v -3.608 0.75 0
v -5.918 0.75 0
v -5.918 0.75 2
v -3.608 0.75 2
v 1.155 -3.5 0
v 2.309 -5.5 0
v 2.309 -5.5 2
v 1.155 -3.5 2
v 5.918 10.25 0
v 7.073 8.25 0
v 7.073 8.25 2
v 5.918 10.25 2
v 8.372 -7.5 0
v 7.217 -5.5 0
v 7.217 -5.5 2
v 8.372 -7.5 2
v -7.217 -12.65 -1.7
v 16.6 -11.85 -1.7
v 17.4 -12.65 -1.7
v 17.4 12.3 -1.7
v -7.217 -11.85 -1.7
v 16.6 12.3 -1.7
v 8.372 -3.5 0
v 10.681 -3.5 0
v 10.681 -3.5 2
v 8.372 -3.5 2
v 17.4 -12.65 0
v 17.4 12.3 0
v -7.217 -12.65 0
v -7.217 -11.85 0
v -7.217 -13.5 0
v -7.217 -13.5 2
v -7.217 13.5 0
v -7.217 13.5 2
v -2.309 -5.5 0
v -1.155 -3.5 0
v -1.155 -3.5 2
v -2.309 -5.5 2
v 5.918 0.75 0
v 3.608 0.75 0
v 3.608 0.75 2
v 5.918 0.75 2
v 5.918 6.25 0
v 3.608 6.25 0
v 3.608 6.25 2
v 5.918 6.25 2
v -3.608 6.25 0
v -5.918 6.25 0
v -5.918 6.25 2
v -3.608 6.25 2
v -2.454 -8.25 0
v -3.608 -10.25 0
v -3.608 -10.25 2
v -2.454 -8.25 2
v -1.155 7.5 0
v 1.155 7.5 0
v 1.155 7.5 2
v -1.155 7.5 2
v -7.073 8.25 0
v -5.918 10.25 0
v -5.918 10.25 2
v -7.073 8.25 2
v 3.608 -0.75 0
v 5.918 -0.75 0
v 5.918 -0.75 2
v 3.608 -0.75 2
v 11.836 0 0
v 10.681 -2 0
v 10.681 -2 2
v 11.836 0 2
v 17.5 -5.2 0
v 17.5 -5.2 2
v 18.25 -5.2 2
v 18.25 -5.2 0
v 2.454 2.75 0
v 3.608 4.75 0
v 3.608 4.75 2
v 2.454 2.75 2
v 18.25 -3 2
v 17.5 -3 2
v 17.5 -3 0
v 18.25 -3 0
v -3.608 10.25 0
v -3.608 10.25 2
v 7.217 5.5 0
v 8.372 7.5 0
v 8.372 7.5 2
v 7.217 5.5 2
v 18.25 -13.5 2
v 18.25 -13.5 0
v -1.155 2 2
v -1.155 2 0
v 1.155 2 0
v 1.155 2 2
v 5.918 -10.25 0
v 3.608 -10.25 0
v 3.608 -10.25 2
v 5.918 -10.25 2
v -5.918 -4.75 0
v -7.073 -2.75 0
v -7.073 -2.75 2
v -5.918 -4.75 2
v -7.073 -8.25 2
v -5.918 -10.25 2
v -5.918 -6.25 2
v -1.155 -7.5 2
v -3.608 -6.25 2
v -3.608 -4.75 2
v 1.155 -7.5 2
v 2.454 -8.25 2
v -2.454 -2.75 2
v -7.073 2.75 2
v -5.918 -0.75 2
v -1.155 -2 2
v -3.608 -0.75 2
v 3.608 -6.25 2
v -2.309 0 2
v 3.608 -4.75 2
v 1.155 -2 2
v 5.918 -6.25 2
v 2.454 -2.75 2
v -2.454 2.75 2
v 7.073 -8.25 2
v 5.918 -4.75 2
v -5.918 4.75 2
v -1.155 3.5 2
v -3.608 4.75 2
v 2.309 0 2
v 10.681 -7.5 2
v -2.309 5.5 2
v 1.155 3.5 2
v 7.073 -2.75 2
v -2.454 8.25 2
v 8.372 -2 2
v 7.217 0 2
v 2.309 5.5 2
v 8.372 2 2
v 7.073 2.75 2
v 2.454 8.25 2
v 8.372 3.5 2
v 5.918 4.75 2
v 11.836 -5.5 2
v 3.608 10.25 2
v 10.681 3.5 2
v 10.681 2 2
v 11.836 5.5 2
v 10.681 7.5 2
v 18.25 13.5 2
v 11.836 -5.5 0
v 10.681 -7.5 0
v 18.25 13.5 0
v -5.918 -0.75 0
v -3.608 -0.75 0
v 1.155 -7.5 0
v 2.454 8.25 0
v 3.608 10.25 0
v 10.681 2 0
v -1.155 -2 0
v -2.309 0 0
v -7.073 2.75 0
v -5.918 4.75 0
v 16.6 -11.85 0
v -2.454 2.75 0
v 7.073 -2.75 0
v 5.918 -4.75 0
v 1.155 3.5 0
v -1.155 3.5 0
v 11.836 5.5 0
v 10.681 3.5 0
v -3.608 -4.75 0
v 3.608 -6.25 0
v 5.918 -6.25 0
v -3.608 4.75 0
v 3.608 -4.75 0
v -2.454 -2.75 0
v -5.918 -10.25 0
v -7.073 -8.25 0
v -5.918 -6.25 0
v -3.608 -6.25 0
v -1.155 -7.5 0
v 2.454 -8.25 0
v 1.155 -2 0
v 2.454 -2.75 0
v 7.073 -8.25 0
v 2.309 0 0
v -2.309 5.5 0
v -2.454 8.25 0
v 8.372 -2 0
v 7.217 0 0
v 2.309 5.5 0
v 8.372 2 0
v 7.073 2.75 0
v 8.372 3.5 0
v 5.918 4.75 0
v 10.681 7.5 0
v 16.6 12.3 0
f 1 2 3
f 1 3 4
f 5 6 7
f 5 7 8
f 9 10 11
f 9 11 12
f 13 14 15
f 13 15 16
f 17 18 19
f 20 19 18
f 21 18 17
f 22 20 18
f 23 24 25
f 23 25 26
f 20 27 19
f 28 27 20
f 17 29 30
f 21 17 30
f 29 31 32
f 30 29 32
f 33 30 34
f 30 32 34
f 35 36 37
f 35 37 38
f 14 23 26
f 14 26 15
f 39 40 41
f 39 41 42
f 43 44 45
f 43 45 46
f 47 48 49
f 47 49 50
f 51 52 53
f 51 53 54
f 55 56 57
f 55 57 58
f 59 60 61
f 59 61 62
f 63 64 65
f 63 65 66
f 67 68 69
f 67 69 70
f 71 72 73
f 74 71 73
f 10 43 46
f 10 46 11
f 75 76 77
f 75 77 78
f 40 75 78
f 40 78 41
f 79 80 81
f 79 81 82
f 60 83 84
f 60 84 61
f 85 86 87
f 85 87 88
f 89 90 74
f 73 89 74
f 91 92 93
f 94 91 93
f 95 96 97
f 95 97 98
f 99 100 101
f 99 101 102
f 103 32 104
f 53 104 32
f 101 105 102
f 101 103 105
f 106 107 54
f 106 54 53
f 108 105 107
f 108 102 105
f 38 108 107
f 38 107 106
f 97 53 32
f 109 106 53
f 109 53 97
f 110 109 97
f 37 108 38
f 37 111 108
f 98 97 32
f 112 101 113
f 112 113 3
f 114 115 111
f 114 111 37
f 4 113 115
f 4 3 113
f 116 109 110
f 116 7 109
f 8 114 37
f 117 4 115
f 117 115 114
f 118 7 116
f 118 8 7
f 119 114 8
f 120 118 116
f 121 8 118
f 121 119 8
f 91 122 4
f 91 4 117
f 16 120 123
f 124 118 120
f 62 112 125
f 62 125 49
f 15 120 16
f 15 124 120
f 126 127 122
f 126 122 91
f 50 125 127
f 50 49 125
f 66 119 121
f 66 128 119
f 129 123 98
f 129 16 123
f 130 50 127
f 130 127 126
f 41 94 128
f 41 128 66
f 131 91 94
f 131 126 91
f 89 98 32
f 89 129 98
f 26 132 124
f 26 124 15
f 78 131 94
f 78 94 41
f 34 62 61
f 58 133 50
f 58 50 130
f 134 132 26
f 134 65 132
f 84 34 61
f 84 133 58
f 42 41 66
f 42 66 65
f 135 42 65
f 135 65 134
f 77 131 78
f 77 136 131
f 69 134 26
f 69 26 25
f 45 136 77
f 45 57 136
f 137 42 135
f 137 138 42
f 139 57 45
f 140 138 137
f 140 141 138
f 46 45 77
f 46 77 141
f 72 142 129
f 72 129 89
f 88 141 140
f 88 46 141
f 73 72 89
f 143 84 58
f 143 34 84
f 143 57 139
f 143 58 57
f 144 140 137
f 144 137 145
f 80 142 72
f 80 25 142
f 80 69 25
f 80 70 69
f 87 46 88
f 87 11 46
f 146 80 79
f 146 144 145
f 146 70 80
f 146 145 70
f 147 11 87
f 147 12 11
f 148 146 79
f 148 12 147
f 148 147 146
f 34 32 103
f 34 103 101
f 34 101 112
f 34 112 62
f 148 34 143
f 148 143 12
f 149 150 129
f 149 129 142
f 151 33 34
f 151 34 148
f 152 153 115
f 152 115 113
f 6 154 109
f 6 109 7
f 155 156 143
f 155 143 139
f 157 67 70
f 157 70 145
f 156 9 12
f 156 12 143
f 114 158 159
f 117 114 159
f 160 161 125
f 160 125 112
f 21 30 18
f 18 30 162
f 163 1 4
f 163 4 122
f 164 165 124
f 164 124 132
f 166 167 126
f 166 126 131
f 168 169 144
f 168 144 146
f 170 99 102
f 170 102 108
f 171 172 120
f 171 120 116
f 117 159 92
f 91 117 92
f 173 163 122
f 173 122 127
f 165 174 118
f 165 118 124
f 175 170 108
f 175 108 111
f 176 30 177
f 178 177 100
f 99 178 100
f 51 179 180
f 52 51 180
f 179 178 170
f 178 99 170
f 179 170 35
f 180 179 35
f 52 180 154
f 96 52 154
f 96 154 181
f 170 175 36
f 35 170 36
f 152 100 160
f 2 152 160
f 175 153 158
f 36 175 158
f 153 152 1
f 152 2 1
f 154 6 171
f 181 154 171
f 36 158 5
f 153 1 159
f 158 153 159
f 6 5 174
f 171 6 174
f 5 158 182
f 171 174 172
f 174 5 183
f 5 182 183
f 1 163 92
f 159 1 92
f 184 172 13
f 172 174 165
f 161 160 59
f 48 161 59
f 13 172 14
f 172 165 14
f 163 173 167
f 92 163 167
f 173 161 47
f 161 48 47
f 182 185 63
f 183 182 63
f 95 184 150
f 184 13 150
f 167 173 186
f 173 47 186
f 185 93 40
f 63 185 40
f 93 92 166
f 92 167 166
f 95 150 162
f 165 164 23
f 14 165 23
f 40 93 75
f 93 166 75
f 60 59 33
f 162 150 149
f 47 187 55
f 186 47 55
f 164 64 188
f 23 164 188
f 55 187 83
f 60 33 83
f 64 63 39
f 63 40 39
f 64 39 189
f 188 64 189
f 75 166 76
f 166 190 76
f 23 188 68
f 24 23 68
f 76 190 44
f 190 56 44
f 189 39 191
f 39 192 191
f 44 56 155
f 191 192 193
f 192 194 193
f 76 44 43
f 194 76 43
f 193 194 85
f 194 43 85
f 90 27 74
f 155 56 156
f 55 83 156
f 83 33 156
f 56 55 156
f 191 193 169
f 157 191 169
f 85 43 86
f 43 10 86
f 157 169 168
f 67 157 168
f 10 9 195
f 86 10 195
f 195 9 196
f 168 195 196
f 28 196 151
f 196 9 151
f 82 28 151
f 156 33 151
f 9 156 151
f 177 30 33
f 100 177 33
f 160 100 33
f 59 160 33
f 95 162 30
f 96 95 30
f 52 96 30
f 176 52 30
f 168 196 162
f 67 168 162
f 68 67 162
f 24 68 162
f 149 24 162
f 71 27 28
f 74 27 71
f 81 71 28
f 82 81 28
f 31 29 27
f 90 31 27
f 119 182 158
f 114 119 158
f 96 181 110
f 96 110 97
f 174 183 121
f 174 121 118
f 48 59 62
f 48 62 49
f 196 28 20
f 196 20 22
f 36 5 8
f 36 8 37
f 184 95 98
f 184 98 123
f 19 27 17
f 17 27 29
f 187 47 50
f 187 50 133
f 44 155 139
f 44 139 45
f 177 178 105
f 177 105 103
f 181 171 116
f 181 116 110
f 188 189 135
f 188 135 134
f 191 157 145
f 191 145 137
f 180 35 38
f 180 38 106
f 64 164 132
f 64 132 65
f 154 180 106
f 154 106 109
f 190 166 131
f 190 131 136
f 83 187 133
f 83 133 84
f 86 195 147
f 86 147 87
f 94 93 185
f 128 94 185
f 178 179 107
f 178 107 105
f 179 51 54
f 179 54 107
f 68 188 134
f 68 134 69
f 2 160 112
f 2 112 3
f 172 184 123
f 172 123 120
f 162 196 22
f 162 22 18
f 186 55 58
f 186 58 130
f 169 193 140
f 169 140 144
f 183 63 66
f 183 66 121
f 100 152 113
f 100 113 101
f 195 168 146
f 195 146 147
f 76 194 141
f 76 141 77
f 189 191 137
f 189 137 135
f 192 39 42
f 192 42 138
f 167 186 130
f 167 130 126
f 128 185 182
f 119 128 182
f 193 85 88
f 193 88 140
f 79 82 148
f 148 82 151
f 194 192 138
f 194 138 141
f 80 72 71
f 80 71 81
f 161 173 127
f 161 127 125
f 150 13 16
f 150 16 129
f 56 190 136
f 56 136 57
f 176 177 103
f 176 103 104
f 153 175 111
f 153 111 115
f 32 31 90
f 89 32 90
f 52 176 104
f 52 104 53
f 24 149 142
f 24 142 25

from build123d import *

# Parameters (mm, degrees)
SKETCH1_W           = 36.5
SKETCH1_H           = 27
BOSS_EXTRUDE1_DEPTH = 2
BOSS_EXTRUDE2_DEPTH = 1.7
CUT_EXTRUDE1_REACH  = 24.788
FILL_PATTERN1_DEPTH = 2
CUT_EXTRUDE3_REACH  = 25
SKETCH5_W           = 0.75
SKETCH5_H           = 2.2
SKETCH6_W           = 11.033121635
SKETCH6_H           = 27
CUT_EXTRUDE4_DEPTH  = 24.000054348


# Read off the part's stored shape, not the designer's step: Fill Pattern1
with BuildPart() as part:
    # Sketch1 → Boss-Extrude1 (new body)
    with BuildSketch(Plane.XY):
        Rectangle(SKETCH1_W, SKETCH1_H)
    extrude(amount=BOSS_EXTRUDE1_DEPTH)

    # Sketch2 → Boss-Extrude2 (add)
    with BuildSketch(Plane(origin=(0, 0, 0), x_dir=(-1, 0, 0), z_dir=(0, 0, -1))):
        Polygon((-17.4, 12.3), (-16.6, 12.3), (-16.6, -11.85), (0, -11.85), (0, -12.65), (-17.4, -12.65), align=None)
    boss_extrude2 = extrude(amount=BOSS_EXTRUDE2_DEPTH)

    # Mirror1: Boss-Extrude2 across plane
    add(boss_extrude2.mirror(Plane(origin=(0, 0, 0), x_dir=(0, 0, 1), z_dir=(1, 0, 0))))

    # Sketch3 → Cut-Extrude1 (cut, up to next)
    with BuildSketch(Plane(origin=(0, 0, 0), x_dir=(-1, 0, 0), z_dir=(0, 0, -1)), mode=Mode.PRIVATE) as cut_extrude1_sk1:
        Polygon((-1.154700538, 2), (-2.309401077, 0), (-1.154700538, -2), (1.154700538, -2), (2.309401077, 0), (1.154700538, 2), align=None)
    cut_extrude1_tool1 = extrude(cut_extrude1_sk1.sketch, amount=-CUT_EXTRUDE1_REACH, mode=Mode.PRIVATE) & part.part
    add(cut_extrude1_tool1.solids().sort_by_distance((0, 0, 0))[0], mode=Mode.SUBTRACT)

    # Fill Pattern1 outline → Fill Pattern1 (cut)
    with BuildSketch(Plane.XY):
        Polygon((11.835680518, 0), (10.68097998, 2), (8.371578903, 2), (7.216878365, 0), (8.371578903, -2), (10.68097998, -2), align=None)
        Polygon((-7.216878365, 0), (-8.371578903, 2), (-10.68097998, 2), (-11.835680518, 0), (-10.68097998, -2), (-8.371578903, -2), align=None)
        Polygon((-3.608439182, -6.25), (-5.917840259, -6.25), (-7.072540798, -8.25), (-5.917840259, -10.25), (-3.608439182, -10.25), (-2.453738644, -8.25), align=None)
        Polygon((5.917840259, 10.25), (3.608439182, 10.25), (2.453738644, 8.25), (3.608439182, 6.25), (5.917840259, 6.25), (7.072540798, 8.25), align=None)
        Polygon((-5.917840259, 10.25), (-7.072540798, 8.25), (-5.917840259, 6.25), (-3.608439182, 6.25), (-2.453738644, 8.25), (-3.608439182, 10.25), align=None)
        Polygon((3.608439182, -6.25), (2.453738644, -8.25), (3.608439182, -10.25), (5.917840259, -10.25), (7.072540798, -8.25), (5.917840259, -6.25), align=None)
        Polygon((2.309401077, 5.5), (1.154700538, 7.5), (-1.154700538, 7.5), (-2.309401077, 5.5), (-1.154700538, 3.5), (1.154700538, 3.5), align=None)
        Polygon((-7.216878365, 5.5), (-8.371578903, 7.5), (-10.68097998, 7.5), (-11.835680518, 5.5), (-10.68097998, 3.5), (-8.371578903, 3.5), align=None)
        Polygon((11.835680518, 5.5), (10.68097998, 7.5), (8.371578903, 7.5), (7.216878365, 5.5), (8.371578903, 3.5), (10.68097998, 3.5), align=None)
        Polygon((-3.608439182, -0.75), (-5.917840259, -0.75), (-7.072540798, -2.75), (-5.917840259, -4.75), (-3.608439182, -4.75), (-2.453738644, -2.75), align=None)
        Polygon((3.608439182, -0.75), (2.453738644, -2.75), (3.608439182, -4.75), (5.917840259, -4.75), (7.072540798, -2.75), (5.917840259, -0.75), align=None)
        Polygon((7.072540798, 2.75), (5.917840259, 4.75), (3.608439182, 4.75), (2.453738644, 2.75), (3.608439182, 0.75), (5.917840259, 0.75), align=None)
        Polygon((-2.453738644, 2.75), (-3.608439182, 4.75), (-5.917840259, 4.75), (-7.072540798, 2.75), (-5.917840259, 0.75), (-3.608439182, 0.75), align=None)
        Polygon((1.154700538, -3.5), (-1.154700538, -3.5), (-2.309401077, -5.5), (-1.154700538, -7.5), (1.154700538, -7.5), (2.309401077, -5.5), align=None)
        Polygon((8.371578903, -3.5), (7.216878365, -5.5), (8.371578903, -7.5), (10.68097998, -7.5), (11.835680518, -5.5), (10.68097998, -3.5), align=None)
        Polygon((-7.216878365, -5.5), (-8.371578903, -3.5), (-10.68097998, -3.5), (-11.835680518, -5.5), (-10.68097998, -7.5), (-8.371578903, -7.5), align=None)
    extrude(amount=FILL_PATTERN1_DEPTH, mode=Mode.SUBTRACT)

    # Sketch5 → Cut-Extrude3 (cut, up to next)
    with BuildSketch(Plane.XY.offset(2), mode=Mode.PRIVATE) as cut_extrude3_sk1:
        with Locations((17.875, -4.1)):
            Rectangle(SKETCH5_W, SKETCH5_H)
    cut_extrude3_tool1 = extrude(cut_extrude3_sk1.sketch, amount=-CUT_EXTRUDE3_REACH, mode=Mode.PRIVATE) & part.part
    cut_extrude3 = cut_extrude3_tool1.solids().sort_by_distance((17.875, -4.1, 2))[0]
    add(cut_extrude3, mode=Mode.SUBTRACT)

    # Mirror2: Cut-Extrude3 across plane
    add(cut_extrude3.mirror(Plane(origin=(0, 0, 0), x_dir=(0, 0, 1), z_dir=(1, 0, 0))), mode=Mode.SUBTRACT)

    # Sketch6 → Cut-Extrude4 (cut, through all)
    with BuildSketch(Plane.XY.offset(2)):
        with Locations((-12.733439182, 0)):
            Rectangle(SKETCH6_W, SKETCH6_H)
    extrude(amount=-CUT_EXTRUDE4_DEPTH, mode=Mode.SUBTRACT)


solid = part.part
